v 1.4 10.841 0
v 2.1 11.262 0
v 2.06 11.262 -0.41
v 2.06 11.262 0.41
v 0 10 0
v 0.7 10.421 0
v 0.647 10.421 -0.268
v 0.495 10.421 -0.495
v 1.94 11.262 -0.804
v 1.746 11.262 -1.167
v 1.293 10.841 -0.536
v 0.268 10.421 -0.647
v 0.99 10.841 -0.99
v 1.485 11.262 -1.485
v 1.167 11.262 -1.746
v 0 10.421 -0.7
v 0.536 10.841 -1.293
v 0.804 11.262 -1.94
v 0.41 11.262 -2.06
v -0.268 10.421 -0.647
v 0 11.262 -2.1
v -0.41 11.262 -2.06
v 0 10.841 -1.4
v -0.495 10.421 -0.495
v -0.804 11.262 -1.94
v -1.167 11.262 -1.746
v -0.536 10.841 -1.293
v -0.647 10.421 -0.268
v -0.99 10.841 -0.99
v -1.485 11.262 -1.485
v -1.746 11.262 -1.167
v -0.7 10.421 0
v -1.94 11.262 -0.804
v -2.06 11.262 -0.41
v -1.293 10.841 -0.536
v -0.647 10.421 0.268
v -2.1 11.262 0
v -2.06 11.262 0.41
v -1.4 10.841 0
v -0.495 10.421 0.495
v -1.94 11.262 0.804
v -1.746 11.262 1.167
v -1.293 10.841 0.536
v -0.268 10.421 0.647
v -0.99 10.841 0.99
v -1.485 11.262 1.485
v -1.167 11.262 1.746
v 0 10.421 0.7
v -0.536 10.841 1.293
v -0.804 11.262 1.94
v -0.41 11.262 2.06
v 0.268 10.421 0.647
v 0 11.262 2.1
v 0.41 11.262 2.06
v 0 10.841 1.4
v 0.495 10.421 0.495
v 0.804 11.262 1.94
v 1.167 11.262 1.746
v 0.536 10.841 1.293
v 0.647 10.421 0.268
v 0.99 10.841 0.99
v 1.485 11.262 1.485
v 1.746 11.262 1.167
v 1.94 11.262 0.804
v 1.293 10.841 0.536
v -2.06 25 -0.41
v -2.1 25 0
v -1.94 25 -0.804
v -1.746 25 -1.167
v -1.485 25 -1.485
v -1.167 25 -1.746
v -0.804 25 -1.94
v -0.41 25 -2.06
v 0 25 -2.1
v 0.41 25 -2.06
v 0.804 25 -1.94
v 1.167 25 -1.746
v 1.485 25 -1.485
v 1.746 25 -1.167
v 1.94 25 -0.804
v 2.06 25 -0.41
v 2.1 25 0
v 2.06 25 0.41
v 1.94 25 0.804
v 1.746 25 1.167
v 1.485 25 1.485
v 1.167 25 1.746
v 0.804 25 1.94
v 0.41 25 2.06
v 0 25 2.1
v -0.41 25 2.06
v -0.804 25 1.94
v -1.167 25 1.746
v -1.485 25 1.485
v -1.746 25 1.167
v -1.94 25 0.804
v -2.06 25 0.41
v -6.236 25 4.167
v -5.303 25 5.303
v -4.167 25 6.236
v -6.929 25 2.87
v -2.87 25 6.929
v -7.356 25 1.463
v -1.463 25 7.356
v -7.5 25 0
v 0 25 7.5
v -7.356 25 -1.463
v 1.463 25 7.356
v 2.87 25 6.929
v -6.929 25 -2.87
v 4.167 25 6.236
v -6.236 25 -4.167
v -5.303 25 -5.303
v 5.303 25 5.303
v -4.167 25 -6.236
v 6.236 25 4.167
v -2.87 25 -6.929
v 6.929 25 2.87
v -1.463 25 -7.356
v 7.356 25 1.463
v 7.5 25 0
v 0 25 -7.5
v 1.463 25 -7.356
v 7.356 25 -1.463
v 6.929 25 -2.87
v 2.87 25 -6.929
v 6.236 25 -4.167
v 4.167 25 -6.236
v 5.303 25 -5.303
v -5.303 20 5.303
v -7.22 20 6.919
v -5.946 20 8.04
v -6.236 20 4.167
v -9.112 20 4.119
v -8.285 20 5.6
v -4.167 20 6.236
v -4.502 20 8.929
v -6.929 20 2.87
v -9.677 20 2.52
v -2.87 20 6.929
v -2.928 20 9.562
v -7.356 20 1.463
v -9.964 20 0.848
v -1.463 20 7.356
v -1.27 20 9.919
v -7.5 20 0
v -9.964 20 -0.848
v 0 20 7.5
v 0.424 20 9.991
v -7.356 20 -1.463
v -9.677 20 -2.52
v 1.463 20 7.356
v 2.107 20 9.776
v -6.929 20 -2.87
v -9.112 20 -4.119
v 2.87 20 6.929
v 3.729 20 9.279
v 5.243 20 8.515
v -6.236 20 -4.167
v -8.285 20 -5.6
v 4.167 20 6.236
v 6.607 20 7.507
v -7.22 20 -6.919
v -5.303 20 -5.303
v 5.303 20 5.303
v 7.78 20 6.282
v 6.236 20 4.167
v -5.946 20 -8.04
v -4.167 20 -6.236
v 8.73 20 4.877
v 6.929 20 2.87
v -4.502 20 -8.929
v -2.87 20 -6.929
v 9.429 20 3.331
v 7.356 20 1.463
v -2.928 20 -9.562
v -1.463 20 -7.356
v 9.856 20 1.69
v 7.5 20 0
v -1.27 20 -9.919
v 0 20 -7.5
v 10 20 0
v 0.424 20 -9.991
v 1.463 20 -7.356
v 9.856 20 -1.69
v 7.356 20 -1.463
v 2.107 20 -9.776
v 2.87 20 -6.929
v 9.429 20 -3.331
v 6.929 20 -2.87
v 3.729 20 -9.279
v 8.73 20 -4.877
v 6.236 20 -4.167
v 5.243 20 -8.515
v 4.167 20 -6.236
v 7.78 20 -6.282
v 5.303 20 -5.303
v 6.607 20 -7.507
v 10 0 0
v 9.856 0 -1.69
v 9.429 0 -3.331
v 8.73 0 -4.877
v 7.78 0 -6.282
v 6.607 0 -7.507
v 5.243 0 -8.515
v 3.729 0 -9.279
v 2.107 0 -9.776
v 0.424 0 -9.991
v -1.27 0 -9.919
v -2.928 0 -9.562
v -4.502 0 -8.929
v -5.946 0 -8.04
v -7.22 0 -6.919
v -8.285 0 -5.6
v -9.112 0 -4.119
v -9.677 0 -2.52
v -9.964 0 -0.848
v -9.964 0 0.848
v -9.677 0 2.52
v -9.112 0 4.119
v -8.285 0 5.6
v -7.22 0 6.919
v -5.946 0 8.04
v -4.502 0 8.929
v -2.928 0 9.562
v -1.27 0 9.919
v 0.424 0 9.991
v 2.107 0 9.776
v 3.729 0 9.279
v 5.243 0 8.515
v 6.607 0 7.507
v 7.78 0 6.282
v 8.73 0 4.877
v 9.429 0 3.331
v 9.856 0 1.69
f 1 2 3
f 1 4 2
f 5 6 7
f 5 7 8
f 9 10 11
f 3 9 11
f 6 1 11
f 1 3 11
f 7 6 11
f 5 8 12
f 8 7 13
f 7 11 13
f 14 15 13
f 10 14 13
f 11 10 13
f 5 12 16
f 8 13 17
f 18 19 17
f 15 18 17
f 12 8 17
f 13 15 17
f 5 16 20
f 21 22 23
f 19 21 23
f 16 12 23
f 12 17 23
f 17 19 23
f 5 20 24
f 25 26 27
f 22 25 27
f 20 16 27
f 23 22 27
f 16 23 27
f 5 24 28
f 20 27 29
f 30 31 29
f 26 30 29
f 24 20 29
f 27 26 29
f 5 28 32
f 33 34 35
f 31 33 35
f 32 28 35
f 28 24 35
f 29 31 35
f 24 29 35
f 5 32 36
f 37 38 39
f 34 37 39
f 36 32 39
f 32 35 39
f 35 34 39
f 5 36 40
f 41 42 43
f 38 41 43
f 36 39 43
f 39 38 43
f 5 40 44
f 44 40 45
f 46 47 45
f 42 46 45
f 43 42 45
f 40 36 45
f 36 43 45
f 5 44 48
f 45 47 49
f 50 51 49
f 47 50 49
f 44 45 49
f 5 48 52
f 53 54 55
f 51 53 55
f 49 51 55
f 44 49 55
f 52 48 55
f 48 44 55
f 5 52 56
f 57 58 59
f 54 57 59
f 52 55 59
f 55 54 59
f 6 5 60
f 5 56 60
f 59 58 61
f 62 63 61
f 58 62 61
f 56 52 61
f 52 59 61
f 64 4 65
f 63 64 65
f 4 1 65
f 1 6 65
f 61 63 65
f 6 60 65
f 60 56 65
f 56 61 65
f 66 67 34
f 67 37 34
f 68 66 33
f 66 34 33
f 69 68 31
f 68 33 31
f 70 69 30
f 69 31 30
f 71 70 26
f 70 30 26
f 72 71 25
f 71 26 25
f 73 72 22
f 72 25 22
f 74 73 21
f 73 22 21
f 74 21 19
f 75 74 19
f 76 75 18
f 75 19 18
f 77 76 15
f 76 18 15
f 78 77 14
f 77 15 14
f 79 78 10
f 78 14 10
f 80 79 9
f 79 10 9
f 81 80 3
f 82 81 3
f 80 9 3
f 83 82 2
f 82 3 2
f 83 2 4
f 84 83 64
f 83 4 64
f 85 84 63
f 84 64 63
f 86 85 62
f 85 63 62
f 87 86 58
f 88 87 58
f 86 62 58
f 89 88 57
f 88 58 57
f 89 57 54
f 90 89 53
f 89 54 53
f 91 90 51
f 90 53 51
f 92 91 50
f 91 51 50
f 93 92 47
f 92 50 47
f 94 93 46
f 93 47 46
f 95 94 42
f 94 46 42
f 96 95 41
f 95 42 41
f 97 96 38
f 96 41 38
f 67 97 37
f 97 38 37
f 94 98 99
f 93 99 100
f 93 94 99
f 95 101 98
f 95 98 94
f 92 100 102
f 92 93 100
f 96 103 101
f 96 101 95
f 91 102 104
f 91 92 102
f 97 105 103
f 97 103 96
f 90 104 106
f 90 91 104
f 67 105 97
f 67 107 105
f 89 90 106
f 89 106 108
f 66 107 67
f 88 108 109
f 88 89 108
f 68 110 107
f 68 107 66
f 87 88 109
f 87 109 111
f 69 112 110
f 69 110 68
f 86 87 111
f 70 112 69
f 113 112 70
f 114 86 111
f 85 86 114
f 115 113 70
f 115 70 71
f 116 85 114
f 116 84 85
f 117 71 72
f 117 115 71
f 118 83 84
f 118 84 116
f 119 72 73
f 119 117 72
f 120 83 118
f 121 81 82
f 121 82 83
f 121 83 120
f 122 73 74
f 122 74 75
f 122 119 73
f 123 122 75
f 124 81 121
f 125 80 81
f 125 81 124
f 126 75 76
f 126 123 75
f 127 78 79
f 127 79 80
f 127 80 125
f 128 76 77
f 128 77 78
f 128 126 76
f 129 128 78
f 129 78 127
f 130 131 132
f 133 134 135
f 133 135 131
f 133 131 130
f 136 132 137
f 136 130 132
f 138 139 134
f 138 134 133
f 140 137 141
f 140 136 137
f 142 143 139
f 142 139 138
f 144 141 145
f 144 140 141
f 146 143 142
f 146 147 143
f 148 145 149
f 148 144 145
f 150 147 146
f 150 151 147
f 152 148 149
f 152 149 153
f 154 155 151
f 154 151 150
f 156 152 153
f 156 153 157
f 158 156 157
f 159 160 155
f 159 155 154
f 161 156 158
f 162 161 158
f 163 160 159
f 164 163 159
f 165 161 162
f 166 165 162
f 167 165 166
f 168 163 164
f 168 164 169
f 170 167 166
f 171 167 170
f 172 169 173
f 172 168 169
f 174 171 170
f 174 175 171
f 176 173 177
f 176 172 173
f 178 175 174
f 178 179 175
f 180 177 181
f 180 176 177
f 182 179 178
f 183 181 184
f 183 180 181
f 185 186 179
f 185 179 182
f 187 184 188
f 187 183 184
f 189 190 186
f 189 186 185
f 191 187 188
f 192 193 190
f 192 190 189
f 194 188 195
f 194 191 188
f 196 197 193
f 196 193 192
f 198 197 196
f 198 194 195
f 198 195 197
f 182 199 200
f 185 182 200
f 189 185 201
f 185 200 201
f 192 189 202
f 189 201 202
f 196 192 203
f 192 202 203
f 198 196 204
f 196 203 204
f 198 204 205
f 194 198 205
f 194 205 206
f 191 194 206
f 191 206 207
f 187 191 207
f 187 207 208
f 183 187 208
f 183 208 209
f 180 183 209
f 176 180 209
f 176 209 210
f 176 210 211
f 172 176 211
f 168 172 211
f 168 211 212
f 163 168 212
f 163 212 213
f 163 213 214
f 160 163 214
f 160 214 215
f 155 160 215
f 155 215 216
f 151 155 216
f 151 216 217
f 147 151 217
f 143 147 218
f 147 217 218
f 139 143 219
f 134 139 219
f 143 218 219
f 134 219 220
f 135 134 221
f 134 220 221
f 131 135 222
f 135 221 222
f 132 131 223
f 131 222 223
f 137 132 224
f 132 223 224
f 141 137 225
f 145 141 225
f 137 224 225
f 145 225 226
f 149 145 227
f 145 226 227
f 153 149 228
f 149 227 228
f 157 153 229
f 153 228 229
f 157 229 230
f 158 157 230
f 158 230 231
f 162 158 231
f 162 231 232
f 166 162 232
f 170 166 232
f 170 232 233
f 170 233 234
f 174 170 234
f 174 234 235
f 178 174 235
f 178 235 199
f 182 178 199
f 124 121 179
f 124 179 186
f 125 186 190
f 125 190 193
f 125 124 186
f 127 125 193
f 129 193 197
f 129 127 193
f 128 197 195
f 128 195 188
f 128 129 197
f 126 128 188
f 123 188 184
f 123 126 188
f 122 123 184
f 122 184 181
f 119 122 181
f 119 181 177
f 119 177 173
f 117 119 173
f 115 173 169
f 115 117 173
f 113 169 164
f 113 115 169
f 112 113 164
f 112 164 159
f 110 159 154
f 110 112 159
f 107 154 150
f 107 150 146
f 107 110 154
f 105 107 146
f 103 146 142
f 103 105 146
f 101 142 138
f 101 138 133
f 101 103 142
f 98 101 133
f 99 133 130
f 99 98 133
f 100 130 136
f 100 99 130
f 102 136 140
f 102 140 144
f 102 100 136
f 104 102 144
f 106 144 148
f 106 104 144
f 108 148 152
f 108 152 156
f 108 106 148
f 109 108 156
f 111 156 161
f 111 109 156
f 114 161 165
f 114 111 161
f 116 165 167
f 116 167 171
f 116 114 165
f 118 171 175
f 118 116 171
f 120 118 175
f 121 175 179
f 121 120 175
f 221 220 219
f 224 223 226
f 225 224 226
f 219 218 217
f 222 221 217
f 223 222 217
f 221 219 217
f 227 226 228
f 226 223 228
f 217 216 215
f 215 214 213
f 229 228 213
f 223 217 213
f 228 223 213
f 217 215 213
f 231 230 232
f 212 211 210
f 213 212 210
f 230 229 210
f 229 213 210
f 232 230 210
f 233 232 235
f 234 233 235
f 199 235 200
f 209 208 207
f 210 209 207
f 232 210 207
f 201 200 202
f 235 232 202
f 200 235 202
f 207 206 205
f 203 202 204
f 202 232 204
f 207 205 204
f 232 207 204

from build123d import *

# Parameters (mm, degrees)
SKETCH1_R             = 10
BOSS_EXTRUDE1_DEPTH   = 25
M5_TAPPED_HOLE1_D     = 4.2
M5_TAPPED_HOLE1_DEPTH = 13.7381927
M5_TAPPED_HOLE1_TIP   = 1.2618073
SKETCH18_R            = 10
SKETCH18_R_2          = 7.5
CUT_EXTRUDE1_DEPTH    = 5


with BuildPart() as part:
    # Sketch1 → Boss-Extrude1 (new body)
    with BuildSketch(Plane(origin=(0, 0, 0), x_dir=(1, 0, 0), z_dir=(0, 1, 0))):
        Circle(SKETCH1_R)
    extrude(amount=BOSS_EXTRUDE1_DEPTH)

    # M5 Tapped Hole1
    with Locations(Plane(origin=(0, 25, 0), x_dir=(1, 0, 0), z_dir=(0, 1, 0))):
        with Locations((0, 0)):
            Hole(M5_TAPPED_HOLE1_D / 2, depth=M5_TAPPED_HOLE1_DEPTH)
            with Locations((0, 0, -(M5_TAPPED_HOLE1_DEPTH + M5_TAPPED_HOLE1_TIP / 2))):  # 118° drill point
                Cone(0, M5_TAPPED_HOLE1_D / 2, M5_TAPPED_HOLE1_TIP, mode=Mode.SUBTRACT)

    # Sketch18 → Cut-Extrude1 (cut)
    with BuildSketch(Plane(origin=(0, 25, 0), x_dir=(1, 0, 0), z_dir=(0, 1, 0))):
        Circle(SKETCH18_R)
        Circle(SKETCH18_R_2, mode=Mode.SUBTRACT)
    extrude(amount=-CUT_EXTRUDE1_DEPTH, mode=Mode.SUBTRACT)


solid = part.part
